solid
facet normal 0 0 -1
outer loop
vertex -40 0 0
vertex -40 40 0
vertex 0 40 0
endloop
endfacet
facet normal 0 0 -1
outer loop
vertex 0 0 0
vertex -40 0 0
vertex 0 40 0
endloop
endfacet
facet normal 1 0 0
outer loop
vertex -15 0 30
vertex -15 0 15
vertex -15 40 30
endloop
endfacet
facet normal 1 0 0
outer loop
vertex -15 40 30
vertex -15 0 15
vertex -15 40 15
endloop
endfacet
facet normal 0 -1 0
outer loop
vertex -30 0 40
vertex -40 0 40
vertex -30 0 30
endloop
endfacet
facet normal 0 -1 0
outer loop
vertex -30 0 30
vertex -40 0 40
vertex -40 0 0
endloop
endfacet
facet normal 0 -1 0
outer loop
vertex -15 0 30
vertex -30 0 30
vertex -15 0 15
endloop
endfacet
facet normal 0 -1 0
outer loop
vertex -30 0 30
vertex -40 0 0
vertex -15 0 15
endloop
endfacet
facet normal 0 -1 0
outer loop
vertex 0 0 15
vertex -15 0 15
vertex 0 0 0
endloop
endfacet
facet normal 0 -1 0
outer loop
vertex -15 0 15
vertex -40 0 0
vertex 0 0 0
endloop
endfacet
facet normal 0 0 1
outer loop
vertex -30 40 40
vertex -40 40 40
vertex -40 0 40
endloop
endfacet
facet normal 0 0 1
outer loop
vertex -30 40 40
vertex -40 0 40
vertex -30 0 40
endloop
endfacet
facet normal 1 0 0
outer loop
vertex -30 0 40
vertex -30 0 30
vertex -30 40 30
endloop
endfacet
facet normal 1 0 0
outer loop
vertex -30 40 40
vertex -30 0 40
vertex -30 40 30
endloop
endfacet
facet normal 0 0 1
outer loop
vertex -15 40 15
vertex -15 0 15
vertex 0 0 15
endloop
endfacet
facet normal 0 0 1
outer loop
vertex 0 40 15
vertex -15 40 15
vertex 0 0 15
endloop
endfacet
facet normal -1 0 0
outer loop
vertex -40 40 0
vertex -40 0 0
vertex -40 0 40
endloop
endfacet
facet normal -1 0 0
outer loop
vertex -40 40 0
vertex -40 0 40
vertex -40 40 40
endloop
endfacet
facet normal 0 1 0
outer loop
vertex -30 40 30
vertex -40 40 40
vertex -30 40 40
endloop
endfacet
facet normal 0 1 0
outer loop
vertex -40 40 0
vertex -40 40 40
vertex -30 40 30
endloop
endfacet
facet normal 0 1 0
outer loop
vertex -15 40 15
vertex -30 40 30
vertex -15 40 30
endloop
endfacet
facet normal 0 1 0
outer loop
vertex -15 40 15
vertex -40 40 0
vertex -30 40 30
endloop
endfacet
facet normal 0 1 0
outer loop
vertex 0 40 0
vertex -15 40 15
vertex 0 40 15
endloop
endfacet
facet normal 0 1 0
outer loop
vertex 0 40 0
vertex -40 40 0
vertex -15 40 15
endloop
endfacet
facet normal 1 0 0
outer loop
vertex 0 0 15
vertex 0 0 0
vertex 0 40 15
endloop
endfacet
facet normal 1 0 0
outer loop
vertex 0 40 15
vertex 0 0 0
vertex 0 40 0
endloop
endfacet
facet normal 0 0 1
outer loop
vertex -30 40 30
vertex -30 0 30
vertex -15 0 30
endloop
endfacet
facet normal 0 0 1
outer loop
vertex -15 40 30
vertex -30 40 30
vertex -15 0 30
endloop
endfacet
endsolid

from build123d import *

# Parameters (mm, degrees)
SKETCH1_W           = 10
SKETCH1_H           = 40
BOSS_EXTRUDE3_DEPTH = 40
SKETCH1_5_W         = 15
SKETCH1_5_H         = 40
BOSS_EXTRUDE4_DEPTH = 30
SKETCH1_6_W         = 15
SKETCH1_6_H         = 40
BOSS_EXTRUDE5_DEPTH = 15


with BuildPart() as part:
    # Sketch1 → Boss-Extrude3 (new body)
    with BuildSketch(Plane.XY):
        with Locations((-35, 20)):
            Rectangle(SKETCH1_W, SKETCH1_H)
    extrude(amount=BOSS_EXTRUDE3_DEPTH)

    # Sketch1<5> → Boss-Extrude4 (add)
    with BuildSketch(Plane.XY):
        with Locations((-22.5, 20)):
            Rectangle(SKETCH1_5_W, SKETCH1_5_H)
    extrude(amount=BOSS_EXTRUDE4_DEPTH)

    # Sketch1<6> → Boss-Extrude5 (add)
    with BuildSketch(Plane.XY):
        with Locations((-7.5, 20)):
            Rectangle(SKETCH1_6_W, SKETCH1_6_H)
    extrude(amount=BOSS_EXTRUDE5_DEPTH)


solid = part.part
